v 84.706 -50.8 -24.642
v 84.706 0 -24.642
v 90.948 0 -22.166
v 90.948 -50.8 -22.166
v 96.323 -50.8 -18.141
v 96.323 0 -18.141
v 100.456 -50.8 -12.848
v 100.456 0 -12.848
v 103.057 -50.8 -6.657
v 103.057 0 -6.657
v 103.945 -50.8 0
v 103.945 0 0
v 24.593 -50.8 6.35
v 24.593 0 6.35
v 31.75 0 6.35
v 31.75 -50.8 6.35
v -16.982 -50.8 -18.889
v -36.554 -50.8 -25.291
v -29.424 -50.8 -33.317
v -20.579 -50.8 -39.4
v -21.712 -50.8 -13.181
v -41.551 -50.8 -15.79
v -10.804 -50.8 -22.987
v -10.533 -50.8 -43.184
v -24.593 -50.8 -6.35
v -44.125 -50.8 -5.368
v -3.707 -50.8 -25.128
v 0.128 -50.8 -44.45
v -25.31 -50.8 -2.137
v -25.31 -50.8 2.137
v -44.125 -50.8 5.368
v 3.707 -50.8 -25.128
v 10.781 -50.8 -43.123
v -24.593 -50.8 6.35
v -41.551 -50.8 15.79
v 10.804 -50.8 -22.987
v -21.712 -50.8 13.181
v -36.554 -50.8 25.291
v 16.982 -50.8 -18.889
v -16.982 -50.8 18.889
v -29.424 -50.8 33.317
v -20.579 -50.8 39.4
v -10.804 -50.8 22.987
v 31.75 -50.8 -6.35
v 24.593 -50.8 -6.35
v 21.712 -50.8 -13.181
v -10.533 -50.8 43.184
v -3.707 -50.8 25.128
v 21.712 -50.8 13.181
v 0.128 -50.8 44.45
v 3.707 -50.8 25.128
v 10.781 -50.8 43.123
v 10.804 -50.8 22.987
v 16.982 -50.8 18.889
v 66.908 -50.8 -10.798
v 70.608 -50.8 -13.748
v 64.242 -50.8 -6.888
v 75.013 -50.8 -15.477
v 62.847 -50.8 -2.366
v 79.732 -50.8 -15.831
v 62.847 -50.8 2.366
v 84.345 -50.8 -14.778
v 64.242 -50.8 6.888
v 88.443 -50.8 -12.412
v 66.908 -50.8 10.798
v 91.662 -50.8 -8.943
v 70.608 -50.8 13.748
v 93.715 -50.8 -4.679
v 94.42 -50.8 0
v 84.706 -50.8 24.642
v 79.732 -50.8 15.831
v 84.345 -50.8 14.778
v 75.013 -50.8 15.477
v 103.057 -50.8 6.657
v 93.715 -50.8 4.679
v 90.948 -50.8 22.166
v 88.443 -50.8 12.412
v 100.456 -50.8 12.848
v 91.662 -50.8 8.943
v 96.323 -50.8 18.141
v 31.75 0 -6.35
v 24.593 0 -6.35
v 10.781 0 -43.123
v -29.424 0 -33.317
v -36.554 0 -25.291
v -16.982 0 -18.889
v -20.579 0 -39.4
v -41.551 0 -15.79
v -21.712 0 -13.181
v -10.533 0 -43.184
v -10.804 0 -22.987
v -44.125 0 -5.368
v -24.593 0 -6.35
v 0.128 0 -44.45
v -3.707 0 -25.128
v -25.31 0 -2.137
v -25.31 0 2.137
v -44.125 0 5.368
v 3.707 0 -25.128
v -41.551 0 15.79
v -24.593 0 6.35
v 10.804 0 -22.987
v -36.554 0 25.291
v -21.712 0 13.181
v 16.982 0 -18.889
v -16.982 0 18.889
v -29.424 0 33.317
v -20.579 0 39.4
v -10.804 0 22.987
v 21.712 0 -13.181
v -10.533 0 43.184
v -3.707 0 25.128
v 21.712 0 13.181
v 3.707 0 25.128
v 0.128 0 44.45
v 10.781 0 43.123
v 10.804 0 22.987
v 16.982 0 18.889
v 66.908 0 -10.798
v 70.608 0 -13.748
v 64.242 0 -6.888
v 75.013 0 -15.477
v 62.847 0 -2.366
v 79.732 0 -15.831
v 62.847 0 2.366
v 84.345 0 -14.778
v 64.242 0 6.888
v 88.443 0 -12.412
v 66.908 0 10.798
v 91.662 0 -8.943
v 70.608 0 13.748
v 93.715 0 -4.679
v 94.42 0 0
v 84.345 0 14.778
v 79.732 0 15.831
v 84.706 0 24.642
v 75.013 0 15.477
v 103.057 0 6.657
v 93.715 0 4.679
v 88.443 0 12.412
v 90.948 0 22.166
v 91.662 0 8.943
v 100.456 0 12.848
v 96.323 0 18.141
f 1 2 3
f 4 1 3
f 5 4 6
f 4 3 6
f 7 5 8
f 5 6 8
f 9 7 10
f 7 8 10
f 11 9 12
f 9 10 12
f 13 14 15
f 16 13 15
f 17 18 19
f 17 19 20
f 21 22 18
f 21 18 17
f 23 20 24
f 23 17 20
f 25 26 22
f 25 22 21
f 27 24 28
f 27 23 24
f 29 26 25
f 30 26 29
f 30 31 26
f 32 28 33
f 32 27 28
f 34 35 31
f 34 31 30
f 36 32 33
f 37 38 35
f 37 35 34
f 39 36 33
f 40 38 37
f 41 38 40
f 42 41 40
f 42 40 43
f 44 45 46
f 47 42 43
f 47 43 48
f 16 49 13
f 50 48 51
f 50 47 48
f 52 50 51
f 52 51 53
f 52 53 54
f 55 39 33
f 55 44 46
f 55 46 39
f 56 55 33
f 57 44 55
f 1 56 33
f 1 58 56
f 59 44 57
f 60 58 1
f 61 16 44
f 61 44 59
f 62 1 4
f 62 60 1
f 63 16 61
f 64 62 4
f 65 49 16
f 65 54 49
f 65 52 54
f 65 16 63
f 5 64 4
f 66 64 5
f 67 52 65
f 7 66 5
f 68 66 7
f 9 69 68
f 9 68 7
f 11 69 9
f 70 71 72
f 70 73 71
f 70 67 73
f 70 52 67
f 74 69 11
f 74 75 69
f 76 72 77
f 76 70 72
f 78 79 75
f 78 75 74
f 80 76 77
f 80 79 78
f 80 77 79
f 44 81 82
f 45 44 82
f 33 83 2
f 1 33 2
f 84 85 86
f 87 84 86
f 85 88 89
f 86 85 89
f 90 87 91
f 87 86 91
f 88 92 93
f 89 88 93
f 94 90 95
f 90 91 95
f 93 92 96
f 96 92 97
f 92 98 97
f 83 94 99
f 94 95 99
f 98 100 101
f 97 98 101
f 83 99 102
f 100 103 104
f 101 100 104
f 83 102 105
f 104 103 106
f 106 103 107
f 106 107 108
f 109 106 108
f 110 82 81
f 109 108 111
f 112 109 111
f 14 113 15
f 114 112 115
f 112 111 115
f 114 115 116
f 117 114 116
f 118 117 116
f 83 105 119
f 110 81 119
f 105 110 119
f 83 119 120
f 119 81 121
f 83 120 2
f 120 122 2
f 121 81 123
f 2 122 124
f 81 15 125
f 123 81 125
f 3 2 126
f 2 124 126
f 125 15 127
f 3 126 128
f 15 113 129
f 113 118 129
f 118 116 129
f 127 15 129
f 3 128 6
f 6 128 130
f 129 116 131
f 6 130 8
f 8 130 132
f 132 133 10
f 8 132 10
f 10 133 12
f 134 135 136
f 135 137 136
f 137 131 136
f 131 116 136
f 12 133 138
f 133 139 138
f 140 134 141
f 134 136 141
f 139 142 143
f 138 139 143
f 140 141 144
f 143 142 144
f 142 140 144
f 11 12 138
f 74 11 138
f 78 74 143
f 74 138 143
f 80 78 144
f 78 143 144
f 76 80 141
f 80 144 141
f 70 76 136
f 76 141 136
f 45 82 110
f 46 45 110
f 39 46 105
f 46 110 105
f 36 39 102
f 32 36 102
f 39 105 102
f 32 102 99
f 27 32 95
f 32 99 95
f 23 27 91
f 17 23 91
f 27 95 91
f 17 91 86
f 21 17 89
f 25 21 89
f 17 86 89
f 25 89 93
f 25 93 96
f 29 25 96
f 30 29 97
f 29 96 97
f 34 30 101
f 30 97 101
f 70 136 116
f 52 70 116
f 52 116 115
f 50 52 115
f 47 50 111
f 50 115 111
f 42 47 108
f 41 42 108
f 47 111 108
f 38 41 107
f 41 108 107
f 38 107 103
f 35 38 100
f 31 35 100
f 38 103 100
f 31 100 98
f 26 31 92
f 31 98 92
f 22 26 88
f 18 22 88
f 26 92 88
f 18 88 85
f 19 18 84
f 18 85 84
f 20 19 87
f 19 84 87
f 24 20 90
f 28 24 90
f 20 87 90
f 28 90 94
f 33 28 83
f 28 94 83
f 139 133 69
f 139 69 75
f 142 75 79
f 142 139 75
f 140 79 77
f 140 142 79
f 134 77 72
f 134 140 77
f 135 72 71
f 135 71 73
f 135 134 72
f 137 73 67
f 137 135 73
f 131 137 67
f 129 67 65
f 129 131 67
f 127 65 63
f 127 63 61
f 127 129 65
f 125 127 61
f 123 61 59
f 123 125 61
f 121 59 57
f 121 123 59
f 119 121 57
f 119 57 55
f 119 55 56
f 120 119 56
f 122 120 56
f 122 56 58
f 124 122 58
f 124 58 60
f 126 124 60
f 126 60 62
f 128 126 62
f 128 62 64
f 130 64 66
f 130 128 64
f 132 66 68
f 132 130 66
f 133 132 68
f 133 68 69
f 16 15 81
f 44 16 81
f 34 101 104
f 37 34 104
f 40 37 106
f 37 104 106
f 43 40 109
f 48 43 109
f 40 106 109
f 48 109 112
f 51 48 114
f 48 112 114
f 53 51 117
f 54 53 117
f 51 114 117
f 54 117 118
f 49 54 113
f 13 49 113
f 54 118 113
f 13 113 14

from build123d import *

# Parameters (mm, degrees)
F0_R     = 15.875
F1_DEPTH = 50.8


with BuildPart() as f1:
    # F0 (on Front) → F1 (new body)
    with BuildSketch(Plane.XZ):
        with BuildLine():
            ThreePointArc((10.780709, -43.122834), (35.035732, -27.355073), (44.45, 0))
            ThreePointArc((44.45, 0), (35.035732, 27.355073), (10.780709, 43.122834))
            ThreePointArc((10.780709, 43.122834), (-44.45, 0), (10.780709, -43.122834))
        make_face()
        with BuildLine():
            ThreePointArc((-24.593444, 6.35), (0, 25.4), (24.593444, 6.35))
            Line((24.593444, 6.35), (31.75, 6.35))
            Line((31.75, 6.35), (31.75, -6.35))
            Line((31.75, -6.35), (24.593444, -6.35))
            ThreePointArc((24.593444, -6.35), (0, -25.4), (-24.593444, -6.35))
            Line((-24.593444, -6.35), (-31.75, -6.35))
            Line((-31.75, -6.35), (-31.75, 6.35))
            Line((-31.75, 6.35), (-24.593444, 6.35))
        make_face(mode=Mode.SUBTRACT)
        with BuildLine():
            ThreePointArc((10.780709, 43.122834), (35.035732, 27.355073), (44.45, 0))
            ThreePointArc((44.45, 0), (35.035732, -27.355073), (10.780709, -43.122834))
            Line((10.780709, -43.122834), (84.705567, -24.64162))
            ThreePointArc((84.705567, -24.64162), (53.145162, 0), (84.705567, 24.64162))
            Line((84.705567, 24.64162), (10.780709, 43.122834))
        make_face()
        with BuildLine():
            ThreePointArc((103.945162, 0), (98.56558, 15.63147), (84.705567, 24.64162))
            ThreePointArc((84.705567, 24.64162), (53.145162, 0), (84.705567, -24.64162))
            ThreePointArc((84.705567, -24.64162), (98.56558, -15.63147), (103.945162, 0))
        make_face()
        with Locations((78.545162, 0)):
            Circle(F0_R, mode=Mode.SUBTRACT)
        with BuildLine():
            ThreePointArc((-24.593444, -6.35), (-25.4, 0), (-24.593444, 6.35))
            Line((-24.593444, 6.35), (-31.75, 6.35))
            Line((-31.75, 6.35), (-31.75, -6.35))
            Line((-31.75, -6.35), (-24.593444, -6.35))
        make_face()
    extrude(amount=F1_DEPTH)


solid = f1.part
